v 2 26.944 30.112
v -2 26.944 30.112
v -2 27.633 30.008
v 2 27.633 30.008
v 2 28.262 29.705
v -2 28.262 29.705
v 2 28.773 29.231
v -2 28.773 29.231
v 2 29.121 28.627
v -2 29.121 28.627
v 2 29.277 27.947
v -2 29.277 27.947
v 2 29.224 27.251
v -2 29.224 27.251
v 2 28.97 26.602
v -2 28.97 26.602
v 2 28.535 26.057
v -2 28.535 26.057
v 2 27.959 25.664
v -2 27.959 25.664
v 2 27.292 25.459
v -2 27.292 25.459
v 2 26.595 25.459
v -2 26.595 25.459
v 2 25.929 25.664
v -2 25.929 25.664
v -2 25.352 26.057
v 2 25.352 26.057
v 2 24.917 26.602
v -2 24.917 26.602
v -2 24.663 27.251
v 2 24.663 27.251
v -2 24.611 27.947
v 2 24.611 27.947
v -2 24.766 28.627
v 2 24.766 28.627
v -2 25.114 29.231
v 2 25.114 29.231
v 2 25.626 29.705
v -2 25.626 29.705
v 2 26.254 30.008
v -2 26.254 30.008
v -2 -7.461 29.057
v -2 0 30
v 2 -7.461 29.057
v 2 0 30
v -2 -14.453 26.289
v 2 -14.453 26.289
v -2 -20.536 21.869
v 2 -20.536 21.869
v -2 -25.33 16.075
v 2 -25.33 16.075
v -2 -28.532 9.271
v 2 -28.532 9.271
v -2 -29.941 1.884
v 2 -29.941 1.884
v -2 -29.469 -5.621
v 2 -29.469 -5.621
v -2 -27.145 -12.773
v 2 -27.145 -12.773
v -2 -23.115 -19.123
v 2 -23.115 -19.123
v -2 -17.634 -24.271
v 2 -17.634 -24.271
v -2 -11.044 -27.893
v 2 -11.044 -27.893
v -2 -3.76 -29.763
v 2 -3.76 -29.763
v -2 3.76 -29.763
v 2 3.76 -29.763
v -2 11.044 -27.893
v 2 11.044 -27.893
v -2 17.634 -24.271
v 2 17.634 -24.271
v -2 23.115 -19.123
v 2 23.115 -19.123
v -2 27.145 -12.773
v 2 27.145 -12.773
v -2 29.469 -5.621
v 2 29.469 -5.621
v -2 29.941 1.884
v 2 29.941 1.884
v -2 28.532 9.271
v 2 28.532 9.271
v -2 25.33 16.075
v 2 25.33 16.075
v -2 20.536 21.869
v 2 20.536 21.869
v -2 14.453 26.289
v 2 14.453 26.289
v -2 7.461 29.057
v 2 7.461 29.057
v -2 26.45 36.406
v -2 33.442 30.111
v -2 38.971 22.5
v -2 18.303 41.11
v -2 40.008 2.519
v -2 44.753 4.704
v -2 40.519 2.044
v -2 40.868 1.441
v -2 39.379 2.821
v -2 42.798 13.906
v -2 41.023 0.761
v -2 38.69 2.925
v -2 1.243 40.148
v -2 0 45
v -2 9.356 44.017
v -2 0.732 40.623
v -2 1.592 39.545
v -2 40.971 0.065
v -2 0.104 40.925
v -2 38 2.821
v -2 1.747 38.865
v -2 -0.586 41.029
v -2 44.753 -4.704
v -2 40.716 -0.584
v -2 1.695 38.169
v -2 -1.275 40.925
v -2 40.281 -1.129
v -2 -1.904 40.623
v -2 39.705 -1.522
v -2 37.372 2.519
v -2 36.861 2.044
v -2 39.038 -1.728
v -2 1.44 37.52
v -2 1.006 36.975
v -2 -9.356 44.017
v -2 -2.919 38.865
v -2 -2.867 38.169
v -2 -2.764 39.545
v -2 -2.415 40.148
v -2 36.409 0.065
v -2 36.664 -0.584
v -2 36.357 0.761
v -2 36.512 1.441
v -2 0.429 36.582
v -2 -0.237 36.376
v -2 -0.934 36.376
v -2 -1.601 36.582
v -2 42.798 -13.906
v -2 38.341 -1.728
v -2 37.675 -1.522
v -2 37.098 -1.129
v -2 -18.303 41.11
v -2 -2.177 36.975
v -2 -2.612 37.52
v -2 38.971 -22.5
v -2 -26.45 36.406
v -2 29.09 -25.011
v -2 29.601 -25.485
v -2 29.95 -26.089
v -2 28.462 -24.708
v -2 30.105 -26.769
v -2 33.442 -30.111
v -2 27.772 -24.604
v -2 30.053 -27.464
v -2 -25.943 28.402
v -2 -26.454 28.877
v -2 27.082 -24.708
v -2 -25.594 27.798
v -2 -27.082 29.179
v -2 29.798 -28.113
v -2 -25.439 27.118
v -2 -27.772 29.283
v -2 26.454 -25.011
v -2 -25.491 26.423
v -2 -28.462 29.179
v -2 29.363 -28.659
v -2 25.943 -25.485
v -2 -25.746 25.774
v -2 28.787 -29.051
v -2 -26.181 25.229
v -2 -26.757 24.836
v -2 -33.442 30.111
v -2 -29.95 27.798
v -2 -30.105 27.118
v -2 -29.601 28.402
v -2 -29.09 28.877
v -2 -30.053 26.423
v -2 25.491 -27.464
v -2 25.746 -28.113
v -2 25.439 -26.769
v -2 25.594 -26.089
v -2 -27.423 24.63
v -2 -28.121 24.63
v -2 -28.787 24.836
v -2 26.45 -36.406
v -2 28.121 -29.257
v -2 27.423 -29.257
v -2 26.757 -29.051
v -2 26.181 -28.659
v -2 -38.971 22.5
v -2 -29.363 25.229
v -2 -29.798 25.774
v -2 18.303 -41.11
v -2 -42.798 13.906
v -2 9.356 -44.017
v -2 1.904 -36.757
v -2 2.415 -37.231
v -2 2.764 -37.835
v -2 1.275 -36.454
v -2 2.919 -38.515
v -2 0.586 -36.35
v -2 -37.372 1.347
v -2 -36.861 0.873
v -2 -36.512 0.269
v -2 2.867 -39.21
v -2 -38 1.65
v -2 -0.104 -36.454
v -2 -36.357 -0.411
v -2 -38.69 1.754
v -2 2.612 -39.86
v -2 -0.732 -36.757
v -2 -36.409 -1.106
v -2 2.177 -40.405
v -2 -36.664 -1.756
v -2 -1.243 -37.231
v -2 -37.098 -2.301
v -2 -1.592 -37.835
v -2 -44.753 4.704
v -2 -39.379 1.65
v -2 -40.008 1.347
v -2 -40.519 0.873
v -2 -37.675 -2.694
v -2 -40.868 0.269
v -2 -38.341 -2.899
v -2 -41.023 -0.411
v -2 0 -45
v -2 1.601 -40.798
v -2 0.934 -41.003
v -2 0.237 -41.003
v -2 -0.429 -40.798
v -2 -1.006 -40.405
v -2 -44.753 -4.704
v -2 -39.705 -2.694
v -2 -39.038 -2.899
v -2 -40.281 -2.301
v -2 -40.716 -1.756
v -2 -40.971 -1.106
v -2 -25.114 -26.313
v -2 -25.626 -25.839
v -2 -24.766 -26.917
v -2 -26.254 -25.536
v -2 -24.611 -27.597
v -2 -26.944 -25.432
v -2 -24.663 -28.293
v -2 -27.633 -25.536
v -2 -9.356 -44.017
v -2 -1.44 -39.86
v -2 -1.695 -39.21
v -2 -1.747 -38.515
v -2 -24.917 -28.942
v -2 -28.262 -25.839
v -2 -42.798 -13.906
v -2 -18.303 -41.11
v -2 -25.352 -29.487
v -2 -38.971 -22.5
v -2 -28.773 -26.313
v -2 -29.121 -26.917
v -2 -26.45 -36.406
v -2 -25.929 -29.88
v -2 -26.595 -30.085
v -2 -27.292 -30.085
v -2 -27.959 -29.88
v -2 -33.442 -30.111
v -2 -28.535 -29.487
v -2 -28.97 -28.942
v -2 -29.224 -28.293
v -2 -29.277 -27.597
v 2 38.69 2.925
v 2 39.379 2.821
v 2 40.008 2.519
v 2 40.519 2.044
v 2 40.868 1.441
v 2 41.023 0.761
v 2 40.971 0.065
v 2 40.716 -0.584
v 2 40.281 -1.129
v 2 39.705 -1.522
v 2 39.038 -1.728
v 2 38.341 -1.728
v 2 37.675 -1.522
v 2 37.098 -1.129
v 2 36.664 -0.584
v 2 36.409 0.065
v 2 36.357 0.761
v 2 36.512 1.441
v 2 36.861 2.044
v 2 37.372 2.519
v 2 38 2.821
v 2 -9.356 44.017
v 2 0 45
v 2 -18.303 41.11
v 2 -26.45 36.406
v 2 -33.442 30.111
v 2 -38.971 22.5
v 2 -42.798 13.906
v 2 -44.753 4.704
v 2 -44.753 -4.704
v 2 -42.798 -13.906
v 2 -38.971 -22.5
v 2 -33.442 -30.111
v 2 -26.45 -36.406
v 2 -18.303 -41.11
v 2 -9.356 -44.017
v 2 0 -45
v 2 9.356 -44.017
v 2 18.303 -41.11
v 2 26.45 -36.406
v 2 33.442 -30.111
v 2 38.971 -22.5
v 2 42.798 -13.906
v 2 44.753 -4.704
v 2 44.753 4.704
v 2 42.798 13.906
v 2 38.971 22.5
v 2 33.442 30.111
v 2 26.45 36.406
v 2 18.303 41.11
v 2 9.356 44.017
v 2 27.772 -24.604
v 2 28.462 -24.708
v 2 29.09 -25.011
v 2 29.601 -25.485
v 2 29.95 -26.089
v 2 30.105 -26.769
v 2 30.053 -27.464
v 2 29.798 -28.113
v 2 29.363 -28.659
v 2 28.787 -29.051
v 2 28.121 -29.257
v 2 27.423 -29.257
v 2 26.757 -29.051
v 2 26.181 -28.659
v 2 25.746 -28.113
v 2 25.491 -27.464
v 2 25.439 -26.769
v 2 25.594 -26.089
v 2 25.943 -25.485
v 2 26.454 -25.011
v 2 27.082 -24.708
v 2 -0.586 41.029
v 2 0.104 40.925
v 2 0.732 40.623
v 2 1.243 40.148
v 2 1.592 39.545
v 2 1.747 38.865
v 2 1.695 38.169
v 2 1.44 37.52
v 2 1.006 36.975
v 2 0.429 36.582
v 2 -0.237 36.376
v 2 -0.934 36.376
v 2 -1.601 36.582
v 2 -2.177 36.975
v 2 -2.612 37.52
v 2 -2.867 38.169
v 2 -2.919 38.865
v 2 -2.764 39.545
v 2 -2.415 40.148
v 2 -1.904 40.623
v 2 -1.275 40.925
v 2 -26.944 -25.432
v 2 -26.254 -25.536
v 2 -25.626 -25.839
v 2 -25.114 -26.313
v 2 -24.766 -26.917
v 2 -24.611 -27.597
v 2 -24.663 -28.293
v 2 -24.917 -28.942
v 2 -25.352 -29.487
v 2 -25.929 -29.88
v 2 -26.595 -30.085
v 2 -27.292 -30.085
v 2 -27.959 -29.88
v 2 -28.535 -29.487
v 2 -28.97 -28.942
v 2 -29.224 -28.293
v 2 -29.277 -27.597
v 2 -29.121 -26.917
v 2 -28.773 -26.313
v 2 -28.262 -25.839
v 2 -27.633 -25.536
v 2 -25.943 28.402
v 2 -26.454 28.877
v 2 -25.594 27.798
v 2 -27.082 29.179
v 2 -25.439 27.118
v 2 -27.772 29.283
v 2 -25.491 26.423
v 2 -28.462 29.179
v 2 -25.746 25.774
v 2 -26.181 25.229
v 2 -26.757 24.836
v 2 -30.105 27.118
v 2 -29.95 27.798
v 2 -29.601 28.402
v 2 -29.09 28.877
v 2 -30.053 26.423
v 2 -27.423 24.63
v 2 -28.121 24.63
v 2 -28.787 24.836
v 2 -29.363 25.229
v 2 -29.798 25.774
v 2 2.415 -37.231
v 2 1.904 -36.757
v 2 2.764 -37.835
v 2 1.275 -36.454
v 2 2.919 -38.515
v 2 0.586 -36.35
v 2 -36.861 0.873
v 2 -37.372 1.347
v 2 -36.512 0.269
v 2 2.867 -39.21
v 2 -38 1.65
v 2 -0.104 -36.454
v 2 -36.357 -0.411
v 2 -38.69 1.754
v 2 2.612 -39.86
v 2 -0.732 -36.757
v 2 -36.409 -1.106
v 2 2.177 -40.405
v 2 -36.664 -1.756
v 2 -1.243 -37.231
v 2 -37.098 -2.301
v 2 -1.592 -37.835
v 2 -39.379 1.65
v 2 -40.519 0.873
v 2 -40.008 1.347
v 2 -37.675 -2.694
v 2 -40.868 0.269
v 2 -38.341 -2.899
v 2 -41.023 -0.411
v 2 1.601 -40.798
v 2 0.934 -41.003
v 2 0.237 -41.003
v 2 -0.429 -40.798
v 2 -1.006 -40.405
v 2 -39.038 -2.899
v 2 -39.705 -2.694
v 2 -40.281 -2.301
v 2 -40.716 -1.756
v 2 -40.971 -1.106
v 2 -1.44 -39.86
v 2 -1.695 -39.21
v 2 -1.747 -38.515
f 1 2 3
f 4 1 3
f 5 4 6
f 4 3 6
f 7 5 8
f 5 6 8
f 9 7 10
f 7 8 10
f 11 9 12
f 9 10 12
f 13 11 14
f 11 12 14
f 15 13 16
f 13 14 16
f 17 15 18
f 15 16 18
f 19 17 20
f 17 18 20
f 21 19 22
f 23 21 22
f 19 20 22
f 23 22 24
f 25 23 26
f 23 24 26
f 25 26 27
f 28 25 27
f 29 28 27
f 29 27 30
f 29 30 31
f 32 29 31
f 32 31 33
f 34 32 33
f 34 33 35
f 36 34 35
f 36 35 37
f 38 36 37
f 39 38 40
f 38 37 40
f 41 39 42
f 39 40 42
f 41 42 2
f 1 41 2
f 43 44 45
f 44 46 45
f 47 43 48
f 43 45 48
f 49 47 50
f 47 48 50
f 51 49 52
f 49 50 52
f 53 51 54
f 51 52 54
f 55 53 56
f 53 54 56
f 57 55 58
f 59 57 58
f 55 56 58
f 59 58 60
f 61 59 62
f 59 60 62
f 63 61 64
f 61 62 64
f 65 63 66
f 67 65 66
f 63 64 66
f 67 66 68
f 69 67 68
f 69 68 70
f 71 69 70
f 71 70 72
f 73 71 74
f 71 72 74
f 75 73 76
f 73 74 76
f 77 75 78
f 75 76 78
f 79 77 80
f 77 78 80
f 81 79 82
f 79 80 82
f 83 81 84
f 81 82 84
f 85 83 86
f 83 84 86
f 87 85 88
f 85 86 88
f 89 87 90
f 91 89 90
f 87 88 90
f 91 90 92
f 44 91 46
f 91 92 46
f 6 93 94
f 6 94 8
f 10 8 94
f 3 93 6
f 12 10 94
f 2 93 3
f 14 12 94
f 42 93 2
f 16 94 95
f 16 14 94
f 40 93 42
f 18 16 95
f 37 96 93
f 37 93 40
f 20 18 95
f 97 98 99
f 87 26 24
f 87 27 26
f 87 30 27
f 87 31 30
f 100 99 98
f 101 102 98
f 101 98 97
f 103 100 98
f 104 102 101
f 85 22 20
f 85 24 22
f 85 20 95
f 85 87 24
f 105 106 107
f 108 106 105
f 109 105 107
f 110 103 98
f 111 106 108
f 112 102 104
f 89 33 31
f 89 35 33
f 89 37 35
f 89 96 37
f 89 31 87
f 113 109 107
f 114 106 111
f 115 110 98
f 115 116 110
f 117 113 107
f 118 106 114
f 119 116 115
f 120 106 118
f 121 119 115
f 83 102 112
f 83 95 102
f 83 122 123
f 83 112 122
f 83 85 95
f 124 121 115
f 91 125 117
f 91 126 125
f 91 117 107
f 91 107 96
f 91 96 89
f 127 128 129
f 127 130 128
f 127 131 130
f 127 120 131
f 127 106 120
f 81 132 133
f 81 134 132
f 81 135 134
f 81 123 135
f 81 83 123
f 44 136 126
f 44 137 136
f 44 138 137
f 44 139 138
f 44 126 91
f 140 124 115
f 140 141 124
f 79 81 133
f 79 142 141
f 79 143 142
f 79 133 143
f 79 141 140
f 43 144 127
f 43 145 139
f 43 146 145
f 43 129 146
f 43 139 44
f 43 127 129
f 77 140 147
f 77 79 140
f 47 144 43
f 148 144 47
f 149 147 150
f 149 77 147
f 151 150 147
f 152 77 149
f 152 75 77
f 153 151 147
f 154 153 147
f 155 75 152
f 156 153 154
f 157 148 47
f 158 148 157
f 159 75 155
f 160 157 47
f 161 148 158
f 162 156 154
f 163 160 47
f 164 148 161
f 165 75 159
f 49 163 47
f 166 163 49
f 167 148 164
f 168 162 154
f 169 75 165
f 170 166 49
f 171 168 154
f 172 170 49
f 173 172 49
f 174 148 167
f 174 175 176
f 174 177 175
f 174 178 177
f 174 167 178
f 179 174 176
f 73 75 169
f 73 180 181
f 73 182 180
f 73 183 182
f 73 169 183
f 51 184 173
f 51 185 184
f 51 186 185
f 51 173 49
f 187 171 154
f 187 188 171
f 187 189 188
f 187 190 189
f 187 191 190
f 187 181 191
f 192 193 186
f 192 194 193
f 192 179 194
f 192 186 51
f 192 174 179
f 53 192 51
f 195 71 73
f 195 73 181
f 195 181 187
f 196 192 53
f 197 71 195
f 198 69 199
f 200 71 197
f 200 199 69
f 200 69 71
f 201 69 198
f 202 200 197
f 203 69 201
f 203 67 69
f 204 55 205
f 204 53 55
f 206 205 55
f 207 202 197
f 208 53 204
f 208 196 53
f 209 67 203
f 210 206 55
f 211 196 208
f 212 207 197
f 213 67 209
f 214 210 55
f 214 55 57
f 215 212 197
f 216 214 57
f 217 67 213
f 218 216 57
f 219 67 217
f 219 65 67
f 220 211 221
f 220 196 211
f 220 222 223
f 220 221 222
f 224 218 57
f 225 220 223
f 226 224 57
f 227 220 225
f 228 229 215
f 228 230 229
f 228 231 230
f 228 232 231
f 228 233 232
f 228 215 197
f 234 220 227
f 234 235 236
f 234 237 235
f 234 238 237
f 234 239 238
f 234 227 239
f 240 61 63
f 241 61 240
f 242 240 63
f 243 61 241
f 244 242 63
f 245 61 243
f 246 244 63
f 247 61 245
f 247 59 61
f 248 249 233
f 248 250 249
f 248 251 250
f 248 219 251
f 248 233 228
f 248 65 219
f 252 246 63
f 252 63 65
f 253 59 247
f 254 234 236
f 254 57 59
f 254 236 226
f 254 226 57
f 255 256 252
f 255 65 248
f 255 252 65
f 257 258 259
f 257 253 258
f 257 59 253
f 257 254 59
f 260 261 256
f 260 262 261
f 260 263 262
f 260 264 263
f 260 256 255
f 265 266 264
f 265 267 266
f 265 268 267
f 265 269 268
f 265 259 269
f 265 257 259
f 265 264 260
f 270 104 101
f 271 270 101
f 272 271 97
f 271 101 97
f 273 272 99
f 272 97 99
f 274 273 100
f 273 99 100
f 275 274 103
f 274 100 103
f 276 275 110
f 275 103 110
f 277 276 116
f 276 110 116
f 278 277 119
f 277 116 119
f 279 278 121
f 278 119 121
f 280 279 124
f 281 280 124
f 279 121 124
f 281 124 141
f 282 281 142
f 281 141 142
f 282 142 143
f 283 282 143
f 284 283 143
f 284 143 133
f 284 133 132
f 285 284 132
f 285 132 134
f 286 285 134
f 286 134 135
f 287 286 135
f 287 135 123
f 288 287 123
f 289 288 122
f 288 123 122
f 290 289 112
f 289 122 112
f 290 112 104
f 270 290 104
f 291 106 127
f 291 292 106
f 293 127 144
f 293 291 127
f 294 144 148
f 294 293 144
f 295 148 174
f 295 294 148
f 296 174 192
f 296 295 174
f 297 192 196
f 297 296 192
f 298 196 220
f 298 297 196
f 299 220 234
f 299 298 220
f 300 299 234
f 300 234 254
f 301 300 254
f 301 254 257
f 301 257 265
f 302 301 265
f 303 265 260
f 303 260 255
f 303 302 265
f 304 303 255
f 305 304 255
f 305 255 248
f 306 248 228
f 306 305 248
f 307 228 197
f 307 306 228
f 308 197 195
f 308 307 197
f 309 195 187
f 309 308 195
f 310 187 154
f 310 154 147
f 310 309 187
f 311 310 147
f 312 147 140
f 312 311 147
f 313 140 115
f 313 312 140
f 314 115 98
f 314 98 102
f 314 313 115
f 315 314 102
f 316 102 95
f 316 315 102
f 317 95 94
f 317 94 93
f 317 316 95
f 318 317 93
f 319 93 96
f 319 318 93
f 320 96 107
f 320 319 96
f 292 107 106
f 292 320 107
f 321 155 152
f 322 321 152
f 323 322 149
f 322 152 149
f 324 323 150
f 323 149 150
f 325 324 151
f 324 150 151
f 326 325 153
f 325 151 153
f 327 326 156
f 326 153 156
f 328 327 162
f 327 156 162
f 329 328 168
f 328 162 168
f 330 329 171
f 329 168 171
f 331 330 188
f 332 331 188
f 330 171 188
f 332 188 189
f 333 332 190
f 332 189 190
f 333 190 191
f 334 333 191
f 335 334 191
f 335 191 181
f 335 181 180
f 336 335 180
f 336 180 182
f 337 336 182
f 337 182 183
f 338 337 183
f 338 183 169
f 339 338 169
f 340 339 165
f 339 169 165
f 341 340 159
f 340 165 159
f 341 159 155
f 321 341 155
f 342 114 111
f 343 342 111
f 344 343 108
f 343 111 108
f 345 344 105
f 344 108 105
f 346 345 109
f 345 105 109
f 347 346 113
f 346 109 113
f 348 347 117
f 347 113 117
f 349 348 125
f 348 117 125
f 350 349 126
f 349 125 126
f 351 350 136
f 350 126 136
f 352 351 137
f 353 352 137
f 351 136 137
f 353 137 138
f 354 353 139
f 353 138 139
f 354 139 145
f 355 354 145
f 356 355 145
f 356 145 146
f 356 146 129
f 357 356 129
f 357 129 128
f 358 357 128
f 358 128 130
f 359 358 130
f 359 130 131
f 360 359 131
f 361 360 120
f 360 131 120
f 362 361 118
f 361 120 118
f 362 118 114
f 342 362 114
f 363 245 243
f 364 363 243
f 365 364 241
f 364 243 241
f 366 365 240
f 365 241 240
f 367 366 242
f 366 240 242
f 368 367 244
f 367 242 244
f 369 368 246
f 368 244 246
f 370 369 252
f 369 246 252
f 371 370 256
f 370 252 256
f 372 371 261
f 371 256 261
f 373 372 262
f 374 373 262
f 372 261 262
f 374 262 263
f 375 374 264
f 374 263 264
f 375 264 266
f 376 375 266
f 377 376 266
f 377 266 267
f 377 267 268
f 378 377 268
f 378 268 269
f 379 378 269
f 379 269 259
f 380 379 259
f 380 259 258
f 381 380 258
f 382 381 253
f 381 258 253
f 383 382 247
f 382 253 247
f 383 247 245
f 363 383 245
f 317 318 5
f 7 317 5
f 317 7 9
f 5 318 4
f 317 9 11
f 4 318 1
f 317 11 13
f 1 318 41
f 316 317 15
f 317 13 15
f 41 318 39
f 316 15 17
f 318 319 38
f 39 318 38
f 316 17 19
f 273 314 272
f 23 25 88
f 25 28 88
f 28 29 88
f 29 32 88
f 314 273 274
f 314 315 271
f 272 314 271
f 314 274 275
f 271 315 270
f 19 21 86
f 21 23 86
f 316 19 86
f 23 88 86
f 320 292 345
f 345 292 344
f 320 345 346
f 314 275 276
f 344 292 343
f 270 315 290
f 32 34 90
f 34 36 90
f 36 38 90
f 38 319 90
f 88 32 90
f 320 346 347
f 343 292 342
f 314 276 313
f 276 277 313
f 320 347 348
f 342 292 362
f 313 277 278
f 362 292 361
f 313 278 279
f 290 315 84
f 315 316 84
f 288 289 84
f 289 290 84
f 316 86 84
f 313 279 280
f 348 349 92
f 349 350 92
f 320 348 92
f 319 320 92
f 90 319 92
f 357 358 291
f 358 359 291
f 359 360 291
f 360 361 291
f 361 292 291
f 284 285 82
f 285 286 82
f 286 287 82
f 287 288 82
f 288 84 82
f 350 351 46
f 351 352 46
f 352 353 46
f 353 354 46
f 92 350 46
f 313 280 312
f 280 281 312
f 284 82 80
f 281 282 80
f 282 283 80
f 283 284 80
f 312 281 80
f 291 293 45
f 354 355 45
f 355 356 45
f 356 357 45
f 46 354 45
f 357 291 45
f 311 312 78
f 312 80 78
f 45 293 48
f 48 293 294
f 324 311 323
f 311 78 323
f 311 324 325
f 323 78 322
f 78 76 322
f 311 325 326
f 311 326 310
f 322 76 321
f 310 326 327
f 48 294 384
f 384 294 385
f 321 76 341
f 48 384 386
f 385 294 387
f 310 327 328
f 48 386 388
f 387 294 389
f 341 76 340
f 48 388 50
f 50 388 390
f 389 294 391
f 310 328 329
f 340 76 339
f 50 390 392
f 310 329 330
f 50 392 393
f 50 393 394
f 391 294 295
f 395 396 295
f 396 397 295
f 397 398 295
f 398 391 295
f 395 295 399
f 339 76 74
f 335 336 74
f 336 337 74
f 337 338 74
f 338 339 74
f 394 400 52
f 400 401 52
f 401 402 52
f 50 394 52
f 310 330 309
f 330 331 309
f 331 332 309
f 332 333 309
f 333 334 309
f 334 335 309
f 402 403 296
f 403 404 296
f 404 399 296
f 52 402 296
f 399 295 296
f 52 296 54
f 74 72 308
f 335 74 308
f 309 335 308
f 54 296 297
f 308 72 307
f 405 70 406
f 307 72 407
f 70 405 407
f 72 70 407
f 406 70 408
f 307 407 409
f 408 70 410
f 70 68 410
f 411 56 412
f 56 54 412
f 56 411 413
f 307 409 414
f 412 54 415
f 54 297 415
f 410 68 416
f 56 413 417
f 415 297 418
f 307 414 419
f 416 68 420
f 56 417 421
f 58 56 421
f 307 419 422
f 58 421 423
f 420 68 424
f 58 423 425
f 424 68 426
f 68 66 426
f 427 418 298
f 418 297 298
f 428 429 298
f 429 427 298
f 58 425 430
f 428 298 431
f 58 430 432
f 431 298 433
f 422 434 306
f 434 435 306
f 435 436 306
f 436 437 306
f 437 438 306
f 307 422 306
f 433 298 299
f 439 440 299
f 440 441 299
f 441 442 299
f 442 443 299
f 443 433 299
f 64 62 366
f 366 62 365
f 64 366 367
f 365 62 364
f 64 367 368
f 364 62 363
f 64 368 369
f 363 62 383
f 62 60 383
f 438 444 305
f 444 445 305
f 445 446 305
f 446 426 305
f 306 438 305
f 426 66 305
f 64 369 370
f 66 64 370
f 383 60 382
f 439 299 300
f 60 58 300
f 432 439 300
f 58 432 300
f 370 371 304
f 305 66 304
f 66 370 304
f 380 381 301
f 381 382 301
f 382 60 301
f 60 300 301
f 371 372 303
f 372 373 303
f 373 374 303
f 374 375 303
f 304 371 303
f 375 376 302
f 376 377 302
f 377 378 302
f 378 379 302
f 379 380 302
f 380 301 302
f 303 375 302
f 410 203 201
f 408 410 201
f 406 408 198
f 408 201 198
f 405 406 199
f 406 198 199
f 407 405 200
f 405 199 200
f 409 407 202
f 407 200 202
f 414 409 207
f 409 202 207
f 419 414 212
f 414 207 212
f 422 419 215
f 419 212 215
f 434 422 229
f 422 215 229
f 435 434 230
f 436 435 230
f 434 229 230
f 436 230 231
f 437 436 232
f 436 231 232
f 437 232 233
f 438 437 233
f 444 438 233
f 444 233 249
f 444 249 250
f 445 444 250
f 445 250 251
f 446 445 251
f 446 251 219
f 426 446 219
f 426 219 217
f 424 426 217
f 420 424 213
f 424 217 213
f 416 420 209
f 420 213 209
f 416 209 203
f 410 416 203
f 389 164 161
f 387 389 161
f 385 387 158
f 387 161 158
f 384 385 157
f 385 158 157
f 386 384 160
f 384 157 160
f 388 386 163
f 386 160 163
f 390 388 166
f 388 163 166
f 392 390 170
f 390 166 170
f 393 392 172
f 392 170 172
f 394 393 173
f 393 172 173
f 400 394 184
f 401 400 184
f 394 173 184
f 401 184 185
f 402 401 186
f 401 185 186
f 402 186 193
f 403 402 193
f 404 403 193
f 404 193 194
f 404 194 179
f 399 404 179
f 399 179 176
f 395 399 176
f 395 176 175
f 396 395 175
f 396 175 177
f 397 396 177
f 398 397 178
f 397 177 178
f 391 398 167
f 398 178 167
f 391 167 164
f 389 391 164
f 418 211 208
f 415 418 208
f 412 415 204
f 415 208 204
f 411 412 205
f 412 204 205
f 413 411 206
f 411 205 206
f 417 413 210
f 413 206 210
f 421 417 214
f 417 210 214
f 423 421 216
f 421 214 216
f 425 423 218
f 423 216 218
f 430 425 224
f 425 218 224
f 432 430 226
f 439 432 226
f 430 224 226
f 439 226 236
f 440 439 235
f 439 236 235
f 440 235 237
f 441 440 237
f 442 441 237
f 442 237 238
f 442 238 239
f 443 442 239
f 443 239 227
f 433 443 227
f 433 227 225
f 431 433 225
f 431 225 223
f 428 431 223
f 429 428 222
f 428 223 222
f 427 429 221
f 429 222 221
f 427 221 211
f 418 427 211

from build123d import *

# Parameters (mm, degrees)
SKETCH3_W          = 4
SKETCH3_H          = 15
SKETCH4_R          = 2.339551022
CUT_EXTRUDE1_DEPTH = 4


with BuildPart() as part:
    # Sketch3 → Revolve1 (revolve)
    with BuildSketch(Plane.XY, mode=Mode.PRIVATE) as revolve1_sk:
        with Locations((0, 37.5)):
            Rectangle(SKETCH3_W, SKETCH3_H)
    revolve(revolve1_sk.sketch.rotate(Axis((0, 0, 0), (1, 0, 0)), 90), axis=Axis((0, 0, 0), (1, 0, 0)))

    # Sketch4 → Cut-Extrude1 (cut)
    with BuildSketch(Plane.ZY.offset(2)):
        with Locations((0.585786438, 38.689785425)):
            Circle(SKETCH4_R)
        with Locations((27.772023199, 26.943596075)):
            Circle(SKETCH4_R)
        with Locations((38.689785425, -0.585786438)):
            Circle(SKETCH4_R)
        with Locations((26.943596075, -27.772023199)):
            Circle(SKETCH4_R)
        with Locations((-0.585786438, -38.689785425)):
            Circle(SKETCH4_R)
        with Locations((-27.772023199, -26.943596075)):
            Circle(SKETCH4_R)
        with Locations((-38.689785425, 0.585786438)):
            Circle(SKETCH4_R)
        with Locations((-26.943596075, 27.772023199)):
            Circle(SKETCH4_R)
    extrude(amount=-CUT_EXTRUDE1_DEPTH, mode=Mode.SUBTRACT)


solid = part.part
